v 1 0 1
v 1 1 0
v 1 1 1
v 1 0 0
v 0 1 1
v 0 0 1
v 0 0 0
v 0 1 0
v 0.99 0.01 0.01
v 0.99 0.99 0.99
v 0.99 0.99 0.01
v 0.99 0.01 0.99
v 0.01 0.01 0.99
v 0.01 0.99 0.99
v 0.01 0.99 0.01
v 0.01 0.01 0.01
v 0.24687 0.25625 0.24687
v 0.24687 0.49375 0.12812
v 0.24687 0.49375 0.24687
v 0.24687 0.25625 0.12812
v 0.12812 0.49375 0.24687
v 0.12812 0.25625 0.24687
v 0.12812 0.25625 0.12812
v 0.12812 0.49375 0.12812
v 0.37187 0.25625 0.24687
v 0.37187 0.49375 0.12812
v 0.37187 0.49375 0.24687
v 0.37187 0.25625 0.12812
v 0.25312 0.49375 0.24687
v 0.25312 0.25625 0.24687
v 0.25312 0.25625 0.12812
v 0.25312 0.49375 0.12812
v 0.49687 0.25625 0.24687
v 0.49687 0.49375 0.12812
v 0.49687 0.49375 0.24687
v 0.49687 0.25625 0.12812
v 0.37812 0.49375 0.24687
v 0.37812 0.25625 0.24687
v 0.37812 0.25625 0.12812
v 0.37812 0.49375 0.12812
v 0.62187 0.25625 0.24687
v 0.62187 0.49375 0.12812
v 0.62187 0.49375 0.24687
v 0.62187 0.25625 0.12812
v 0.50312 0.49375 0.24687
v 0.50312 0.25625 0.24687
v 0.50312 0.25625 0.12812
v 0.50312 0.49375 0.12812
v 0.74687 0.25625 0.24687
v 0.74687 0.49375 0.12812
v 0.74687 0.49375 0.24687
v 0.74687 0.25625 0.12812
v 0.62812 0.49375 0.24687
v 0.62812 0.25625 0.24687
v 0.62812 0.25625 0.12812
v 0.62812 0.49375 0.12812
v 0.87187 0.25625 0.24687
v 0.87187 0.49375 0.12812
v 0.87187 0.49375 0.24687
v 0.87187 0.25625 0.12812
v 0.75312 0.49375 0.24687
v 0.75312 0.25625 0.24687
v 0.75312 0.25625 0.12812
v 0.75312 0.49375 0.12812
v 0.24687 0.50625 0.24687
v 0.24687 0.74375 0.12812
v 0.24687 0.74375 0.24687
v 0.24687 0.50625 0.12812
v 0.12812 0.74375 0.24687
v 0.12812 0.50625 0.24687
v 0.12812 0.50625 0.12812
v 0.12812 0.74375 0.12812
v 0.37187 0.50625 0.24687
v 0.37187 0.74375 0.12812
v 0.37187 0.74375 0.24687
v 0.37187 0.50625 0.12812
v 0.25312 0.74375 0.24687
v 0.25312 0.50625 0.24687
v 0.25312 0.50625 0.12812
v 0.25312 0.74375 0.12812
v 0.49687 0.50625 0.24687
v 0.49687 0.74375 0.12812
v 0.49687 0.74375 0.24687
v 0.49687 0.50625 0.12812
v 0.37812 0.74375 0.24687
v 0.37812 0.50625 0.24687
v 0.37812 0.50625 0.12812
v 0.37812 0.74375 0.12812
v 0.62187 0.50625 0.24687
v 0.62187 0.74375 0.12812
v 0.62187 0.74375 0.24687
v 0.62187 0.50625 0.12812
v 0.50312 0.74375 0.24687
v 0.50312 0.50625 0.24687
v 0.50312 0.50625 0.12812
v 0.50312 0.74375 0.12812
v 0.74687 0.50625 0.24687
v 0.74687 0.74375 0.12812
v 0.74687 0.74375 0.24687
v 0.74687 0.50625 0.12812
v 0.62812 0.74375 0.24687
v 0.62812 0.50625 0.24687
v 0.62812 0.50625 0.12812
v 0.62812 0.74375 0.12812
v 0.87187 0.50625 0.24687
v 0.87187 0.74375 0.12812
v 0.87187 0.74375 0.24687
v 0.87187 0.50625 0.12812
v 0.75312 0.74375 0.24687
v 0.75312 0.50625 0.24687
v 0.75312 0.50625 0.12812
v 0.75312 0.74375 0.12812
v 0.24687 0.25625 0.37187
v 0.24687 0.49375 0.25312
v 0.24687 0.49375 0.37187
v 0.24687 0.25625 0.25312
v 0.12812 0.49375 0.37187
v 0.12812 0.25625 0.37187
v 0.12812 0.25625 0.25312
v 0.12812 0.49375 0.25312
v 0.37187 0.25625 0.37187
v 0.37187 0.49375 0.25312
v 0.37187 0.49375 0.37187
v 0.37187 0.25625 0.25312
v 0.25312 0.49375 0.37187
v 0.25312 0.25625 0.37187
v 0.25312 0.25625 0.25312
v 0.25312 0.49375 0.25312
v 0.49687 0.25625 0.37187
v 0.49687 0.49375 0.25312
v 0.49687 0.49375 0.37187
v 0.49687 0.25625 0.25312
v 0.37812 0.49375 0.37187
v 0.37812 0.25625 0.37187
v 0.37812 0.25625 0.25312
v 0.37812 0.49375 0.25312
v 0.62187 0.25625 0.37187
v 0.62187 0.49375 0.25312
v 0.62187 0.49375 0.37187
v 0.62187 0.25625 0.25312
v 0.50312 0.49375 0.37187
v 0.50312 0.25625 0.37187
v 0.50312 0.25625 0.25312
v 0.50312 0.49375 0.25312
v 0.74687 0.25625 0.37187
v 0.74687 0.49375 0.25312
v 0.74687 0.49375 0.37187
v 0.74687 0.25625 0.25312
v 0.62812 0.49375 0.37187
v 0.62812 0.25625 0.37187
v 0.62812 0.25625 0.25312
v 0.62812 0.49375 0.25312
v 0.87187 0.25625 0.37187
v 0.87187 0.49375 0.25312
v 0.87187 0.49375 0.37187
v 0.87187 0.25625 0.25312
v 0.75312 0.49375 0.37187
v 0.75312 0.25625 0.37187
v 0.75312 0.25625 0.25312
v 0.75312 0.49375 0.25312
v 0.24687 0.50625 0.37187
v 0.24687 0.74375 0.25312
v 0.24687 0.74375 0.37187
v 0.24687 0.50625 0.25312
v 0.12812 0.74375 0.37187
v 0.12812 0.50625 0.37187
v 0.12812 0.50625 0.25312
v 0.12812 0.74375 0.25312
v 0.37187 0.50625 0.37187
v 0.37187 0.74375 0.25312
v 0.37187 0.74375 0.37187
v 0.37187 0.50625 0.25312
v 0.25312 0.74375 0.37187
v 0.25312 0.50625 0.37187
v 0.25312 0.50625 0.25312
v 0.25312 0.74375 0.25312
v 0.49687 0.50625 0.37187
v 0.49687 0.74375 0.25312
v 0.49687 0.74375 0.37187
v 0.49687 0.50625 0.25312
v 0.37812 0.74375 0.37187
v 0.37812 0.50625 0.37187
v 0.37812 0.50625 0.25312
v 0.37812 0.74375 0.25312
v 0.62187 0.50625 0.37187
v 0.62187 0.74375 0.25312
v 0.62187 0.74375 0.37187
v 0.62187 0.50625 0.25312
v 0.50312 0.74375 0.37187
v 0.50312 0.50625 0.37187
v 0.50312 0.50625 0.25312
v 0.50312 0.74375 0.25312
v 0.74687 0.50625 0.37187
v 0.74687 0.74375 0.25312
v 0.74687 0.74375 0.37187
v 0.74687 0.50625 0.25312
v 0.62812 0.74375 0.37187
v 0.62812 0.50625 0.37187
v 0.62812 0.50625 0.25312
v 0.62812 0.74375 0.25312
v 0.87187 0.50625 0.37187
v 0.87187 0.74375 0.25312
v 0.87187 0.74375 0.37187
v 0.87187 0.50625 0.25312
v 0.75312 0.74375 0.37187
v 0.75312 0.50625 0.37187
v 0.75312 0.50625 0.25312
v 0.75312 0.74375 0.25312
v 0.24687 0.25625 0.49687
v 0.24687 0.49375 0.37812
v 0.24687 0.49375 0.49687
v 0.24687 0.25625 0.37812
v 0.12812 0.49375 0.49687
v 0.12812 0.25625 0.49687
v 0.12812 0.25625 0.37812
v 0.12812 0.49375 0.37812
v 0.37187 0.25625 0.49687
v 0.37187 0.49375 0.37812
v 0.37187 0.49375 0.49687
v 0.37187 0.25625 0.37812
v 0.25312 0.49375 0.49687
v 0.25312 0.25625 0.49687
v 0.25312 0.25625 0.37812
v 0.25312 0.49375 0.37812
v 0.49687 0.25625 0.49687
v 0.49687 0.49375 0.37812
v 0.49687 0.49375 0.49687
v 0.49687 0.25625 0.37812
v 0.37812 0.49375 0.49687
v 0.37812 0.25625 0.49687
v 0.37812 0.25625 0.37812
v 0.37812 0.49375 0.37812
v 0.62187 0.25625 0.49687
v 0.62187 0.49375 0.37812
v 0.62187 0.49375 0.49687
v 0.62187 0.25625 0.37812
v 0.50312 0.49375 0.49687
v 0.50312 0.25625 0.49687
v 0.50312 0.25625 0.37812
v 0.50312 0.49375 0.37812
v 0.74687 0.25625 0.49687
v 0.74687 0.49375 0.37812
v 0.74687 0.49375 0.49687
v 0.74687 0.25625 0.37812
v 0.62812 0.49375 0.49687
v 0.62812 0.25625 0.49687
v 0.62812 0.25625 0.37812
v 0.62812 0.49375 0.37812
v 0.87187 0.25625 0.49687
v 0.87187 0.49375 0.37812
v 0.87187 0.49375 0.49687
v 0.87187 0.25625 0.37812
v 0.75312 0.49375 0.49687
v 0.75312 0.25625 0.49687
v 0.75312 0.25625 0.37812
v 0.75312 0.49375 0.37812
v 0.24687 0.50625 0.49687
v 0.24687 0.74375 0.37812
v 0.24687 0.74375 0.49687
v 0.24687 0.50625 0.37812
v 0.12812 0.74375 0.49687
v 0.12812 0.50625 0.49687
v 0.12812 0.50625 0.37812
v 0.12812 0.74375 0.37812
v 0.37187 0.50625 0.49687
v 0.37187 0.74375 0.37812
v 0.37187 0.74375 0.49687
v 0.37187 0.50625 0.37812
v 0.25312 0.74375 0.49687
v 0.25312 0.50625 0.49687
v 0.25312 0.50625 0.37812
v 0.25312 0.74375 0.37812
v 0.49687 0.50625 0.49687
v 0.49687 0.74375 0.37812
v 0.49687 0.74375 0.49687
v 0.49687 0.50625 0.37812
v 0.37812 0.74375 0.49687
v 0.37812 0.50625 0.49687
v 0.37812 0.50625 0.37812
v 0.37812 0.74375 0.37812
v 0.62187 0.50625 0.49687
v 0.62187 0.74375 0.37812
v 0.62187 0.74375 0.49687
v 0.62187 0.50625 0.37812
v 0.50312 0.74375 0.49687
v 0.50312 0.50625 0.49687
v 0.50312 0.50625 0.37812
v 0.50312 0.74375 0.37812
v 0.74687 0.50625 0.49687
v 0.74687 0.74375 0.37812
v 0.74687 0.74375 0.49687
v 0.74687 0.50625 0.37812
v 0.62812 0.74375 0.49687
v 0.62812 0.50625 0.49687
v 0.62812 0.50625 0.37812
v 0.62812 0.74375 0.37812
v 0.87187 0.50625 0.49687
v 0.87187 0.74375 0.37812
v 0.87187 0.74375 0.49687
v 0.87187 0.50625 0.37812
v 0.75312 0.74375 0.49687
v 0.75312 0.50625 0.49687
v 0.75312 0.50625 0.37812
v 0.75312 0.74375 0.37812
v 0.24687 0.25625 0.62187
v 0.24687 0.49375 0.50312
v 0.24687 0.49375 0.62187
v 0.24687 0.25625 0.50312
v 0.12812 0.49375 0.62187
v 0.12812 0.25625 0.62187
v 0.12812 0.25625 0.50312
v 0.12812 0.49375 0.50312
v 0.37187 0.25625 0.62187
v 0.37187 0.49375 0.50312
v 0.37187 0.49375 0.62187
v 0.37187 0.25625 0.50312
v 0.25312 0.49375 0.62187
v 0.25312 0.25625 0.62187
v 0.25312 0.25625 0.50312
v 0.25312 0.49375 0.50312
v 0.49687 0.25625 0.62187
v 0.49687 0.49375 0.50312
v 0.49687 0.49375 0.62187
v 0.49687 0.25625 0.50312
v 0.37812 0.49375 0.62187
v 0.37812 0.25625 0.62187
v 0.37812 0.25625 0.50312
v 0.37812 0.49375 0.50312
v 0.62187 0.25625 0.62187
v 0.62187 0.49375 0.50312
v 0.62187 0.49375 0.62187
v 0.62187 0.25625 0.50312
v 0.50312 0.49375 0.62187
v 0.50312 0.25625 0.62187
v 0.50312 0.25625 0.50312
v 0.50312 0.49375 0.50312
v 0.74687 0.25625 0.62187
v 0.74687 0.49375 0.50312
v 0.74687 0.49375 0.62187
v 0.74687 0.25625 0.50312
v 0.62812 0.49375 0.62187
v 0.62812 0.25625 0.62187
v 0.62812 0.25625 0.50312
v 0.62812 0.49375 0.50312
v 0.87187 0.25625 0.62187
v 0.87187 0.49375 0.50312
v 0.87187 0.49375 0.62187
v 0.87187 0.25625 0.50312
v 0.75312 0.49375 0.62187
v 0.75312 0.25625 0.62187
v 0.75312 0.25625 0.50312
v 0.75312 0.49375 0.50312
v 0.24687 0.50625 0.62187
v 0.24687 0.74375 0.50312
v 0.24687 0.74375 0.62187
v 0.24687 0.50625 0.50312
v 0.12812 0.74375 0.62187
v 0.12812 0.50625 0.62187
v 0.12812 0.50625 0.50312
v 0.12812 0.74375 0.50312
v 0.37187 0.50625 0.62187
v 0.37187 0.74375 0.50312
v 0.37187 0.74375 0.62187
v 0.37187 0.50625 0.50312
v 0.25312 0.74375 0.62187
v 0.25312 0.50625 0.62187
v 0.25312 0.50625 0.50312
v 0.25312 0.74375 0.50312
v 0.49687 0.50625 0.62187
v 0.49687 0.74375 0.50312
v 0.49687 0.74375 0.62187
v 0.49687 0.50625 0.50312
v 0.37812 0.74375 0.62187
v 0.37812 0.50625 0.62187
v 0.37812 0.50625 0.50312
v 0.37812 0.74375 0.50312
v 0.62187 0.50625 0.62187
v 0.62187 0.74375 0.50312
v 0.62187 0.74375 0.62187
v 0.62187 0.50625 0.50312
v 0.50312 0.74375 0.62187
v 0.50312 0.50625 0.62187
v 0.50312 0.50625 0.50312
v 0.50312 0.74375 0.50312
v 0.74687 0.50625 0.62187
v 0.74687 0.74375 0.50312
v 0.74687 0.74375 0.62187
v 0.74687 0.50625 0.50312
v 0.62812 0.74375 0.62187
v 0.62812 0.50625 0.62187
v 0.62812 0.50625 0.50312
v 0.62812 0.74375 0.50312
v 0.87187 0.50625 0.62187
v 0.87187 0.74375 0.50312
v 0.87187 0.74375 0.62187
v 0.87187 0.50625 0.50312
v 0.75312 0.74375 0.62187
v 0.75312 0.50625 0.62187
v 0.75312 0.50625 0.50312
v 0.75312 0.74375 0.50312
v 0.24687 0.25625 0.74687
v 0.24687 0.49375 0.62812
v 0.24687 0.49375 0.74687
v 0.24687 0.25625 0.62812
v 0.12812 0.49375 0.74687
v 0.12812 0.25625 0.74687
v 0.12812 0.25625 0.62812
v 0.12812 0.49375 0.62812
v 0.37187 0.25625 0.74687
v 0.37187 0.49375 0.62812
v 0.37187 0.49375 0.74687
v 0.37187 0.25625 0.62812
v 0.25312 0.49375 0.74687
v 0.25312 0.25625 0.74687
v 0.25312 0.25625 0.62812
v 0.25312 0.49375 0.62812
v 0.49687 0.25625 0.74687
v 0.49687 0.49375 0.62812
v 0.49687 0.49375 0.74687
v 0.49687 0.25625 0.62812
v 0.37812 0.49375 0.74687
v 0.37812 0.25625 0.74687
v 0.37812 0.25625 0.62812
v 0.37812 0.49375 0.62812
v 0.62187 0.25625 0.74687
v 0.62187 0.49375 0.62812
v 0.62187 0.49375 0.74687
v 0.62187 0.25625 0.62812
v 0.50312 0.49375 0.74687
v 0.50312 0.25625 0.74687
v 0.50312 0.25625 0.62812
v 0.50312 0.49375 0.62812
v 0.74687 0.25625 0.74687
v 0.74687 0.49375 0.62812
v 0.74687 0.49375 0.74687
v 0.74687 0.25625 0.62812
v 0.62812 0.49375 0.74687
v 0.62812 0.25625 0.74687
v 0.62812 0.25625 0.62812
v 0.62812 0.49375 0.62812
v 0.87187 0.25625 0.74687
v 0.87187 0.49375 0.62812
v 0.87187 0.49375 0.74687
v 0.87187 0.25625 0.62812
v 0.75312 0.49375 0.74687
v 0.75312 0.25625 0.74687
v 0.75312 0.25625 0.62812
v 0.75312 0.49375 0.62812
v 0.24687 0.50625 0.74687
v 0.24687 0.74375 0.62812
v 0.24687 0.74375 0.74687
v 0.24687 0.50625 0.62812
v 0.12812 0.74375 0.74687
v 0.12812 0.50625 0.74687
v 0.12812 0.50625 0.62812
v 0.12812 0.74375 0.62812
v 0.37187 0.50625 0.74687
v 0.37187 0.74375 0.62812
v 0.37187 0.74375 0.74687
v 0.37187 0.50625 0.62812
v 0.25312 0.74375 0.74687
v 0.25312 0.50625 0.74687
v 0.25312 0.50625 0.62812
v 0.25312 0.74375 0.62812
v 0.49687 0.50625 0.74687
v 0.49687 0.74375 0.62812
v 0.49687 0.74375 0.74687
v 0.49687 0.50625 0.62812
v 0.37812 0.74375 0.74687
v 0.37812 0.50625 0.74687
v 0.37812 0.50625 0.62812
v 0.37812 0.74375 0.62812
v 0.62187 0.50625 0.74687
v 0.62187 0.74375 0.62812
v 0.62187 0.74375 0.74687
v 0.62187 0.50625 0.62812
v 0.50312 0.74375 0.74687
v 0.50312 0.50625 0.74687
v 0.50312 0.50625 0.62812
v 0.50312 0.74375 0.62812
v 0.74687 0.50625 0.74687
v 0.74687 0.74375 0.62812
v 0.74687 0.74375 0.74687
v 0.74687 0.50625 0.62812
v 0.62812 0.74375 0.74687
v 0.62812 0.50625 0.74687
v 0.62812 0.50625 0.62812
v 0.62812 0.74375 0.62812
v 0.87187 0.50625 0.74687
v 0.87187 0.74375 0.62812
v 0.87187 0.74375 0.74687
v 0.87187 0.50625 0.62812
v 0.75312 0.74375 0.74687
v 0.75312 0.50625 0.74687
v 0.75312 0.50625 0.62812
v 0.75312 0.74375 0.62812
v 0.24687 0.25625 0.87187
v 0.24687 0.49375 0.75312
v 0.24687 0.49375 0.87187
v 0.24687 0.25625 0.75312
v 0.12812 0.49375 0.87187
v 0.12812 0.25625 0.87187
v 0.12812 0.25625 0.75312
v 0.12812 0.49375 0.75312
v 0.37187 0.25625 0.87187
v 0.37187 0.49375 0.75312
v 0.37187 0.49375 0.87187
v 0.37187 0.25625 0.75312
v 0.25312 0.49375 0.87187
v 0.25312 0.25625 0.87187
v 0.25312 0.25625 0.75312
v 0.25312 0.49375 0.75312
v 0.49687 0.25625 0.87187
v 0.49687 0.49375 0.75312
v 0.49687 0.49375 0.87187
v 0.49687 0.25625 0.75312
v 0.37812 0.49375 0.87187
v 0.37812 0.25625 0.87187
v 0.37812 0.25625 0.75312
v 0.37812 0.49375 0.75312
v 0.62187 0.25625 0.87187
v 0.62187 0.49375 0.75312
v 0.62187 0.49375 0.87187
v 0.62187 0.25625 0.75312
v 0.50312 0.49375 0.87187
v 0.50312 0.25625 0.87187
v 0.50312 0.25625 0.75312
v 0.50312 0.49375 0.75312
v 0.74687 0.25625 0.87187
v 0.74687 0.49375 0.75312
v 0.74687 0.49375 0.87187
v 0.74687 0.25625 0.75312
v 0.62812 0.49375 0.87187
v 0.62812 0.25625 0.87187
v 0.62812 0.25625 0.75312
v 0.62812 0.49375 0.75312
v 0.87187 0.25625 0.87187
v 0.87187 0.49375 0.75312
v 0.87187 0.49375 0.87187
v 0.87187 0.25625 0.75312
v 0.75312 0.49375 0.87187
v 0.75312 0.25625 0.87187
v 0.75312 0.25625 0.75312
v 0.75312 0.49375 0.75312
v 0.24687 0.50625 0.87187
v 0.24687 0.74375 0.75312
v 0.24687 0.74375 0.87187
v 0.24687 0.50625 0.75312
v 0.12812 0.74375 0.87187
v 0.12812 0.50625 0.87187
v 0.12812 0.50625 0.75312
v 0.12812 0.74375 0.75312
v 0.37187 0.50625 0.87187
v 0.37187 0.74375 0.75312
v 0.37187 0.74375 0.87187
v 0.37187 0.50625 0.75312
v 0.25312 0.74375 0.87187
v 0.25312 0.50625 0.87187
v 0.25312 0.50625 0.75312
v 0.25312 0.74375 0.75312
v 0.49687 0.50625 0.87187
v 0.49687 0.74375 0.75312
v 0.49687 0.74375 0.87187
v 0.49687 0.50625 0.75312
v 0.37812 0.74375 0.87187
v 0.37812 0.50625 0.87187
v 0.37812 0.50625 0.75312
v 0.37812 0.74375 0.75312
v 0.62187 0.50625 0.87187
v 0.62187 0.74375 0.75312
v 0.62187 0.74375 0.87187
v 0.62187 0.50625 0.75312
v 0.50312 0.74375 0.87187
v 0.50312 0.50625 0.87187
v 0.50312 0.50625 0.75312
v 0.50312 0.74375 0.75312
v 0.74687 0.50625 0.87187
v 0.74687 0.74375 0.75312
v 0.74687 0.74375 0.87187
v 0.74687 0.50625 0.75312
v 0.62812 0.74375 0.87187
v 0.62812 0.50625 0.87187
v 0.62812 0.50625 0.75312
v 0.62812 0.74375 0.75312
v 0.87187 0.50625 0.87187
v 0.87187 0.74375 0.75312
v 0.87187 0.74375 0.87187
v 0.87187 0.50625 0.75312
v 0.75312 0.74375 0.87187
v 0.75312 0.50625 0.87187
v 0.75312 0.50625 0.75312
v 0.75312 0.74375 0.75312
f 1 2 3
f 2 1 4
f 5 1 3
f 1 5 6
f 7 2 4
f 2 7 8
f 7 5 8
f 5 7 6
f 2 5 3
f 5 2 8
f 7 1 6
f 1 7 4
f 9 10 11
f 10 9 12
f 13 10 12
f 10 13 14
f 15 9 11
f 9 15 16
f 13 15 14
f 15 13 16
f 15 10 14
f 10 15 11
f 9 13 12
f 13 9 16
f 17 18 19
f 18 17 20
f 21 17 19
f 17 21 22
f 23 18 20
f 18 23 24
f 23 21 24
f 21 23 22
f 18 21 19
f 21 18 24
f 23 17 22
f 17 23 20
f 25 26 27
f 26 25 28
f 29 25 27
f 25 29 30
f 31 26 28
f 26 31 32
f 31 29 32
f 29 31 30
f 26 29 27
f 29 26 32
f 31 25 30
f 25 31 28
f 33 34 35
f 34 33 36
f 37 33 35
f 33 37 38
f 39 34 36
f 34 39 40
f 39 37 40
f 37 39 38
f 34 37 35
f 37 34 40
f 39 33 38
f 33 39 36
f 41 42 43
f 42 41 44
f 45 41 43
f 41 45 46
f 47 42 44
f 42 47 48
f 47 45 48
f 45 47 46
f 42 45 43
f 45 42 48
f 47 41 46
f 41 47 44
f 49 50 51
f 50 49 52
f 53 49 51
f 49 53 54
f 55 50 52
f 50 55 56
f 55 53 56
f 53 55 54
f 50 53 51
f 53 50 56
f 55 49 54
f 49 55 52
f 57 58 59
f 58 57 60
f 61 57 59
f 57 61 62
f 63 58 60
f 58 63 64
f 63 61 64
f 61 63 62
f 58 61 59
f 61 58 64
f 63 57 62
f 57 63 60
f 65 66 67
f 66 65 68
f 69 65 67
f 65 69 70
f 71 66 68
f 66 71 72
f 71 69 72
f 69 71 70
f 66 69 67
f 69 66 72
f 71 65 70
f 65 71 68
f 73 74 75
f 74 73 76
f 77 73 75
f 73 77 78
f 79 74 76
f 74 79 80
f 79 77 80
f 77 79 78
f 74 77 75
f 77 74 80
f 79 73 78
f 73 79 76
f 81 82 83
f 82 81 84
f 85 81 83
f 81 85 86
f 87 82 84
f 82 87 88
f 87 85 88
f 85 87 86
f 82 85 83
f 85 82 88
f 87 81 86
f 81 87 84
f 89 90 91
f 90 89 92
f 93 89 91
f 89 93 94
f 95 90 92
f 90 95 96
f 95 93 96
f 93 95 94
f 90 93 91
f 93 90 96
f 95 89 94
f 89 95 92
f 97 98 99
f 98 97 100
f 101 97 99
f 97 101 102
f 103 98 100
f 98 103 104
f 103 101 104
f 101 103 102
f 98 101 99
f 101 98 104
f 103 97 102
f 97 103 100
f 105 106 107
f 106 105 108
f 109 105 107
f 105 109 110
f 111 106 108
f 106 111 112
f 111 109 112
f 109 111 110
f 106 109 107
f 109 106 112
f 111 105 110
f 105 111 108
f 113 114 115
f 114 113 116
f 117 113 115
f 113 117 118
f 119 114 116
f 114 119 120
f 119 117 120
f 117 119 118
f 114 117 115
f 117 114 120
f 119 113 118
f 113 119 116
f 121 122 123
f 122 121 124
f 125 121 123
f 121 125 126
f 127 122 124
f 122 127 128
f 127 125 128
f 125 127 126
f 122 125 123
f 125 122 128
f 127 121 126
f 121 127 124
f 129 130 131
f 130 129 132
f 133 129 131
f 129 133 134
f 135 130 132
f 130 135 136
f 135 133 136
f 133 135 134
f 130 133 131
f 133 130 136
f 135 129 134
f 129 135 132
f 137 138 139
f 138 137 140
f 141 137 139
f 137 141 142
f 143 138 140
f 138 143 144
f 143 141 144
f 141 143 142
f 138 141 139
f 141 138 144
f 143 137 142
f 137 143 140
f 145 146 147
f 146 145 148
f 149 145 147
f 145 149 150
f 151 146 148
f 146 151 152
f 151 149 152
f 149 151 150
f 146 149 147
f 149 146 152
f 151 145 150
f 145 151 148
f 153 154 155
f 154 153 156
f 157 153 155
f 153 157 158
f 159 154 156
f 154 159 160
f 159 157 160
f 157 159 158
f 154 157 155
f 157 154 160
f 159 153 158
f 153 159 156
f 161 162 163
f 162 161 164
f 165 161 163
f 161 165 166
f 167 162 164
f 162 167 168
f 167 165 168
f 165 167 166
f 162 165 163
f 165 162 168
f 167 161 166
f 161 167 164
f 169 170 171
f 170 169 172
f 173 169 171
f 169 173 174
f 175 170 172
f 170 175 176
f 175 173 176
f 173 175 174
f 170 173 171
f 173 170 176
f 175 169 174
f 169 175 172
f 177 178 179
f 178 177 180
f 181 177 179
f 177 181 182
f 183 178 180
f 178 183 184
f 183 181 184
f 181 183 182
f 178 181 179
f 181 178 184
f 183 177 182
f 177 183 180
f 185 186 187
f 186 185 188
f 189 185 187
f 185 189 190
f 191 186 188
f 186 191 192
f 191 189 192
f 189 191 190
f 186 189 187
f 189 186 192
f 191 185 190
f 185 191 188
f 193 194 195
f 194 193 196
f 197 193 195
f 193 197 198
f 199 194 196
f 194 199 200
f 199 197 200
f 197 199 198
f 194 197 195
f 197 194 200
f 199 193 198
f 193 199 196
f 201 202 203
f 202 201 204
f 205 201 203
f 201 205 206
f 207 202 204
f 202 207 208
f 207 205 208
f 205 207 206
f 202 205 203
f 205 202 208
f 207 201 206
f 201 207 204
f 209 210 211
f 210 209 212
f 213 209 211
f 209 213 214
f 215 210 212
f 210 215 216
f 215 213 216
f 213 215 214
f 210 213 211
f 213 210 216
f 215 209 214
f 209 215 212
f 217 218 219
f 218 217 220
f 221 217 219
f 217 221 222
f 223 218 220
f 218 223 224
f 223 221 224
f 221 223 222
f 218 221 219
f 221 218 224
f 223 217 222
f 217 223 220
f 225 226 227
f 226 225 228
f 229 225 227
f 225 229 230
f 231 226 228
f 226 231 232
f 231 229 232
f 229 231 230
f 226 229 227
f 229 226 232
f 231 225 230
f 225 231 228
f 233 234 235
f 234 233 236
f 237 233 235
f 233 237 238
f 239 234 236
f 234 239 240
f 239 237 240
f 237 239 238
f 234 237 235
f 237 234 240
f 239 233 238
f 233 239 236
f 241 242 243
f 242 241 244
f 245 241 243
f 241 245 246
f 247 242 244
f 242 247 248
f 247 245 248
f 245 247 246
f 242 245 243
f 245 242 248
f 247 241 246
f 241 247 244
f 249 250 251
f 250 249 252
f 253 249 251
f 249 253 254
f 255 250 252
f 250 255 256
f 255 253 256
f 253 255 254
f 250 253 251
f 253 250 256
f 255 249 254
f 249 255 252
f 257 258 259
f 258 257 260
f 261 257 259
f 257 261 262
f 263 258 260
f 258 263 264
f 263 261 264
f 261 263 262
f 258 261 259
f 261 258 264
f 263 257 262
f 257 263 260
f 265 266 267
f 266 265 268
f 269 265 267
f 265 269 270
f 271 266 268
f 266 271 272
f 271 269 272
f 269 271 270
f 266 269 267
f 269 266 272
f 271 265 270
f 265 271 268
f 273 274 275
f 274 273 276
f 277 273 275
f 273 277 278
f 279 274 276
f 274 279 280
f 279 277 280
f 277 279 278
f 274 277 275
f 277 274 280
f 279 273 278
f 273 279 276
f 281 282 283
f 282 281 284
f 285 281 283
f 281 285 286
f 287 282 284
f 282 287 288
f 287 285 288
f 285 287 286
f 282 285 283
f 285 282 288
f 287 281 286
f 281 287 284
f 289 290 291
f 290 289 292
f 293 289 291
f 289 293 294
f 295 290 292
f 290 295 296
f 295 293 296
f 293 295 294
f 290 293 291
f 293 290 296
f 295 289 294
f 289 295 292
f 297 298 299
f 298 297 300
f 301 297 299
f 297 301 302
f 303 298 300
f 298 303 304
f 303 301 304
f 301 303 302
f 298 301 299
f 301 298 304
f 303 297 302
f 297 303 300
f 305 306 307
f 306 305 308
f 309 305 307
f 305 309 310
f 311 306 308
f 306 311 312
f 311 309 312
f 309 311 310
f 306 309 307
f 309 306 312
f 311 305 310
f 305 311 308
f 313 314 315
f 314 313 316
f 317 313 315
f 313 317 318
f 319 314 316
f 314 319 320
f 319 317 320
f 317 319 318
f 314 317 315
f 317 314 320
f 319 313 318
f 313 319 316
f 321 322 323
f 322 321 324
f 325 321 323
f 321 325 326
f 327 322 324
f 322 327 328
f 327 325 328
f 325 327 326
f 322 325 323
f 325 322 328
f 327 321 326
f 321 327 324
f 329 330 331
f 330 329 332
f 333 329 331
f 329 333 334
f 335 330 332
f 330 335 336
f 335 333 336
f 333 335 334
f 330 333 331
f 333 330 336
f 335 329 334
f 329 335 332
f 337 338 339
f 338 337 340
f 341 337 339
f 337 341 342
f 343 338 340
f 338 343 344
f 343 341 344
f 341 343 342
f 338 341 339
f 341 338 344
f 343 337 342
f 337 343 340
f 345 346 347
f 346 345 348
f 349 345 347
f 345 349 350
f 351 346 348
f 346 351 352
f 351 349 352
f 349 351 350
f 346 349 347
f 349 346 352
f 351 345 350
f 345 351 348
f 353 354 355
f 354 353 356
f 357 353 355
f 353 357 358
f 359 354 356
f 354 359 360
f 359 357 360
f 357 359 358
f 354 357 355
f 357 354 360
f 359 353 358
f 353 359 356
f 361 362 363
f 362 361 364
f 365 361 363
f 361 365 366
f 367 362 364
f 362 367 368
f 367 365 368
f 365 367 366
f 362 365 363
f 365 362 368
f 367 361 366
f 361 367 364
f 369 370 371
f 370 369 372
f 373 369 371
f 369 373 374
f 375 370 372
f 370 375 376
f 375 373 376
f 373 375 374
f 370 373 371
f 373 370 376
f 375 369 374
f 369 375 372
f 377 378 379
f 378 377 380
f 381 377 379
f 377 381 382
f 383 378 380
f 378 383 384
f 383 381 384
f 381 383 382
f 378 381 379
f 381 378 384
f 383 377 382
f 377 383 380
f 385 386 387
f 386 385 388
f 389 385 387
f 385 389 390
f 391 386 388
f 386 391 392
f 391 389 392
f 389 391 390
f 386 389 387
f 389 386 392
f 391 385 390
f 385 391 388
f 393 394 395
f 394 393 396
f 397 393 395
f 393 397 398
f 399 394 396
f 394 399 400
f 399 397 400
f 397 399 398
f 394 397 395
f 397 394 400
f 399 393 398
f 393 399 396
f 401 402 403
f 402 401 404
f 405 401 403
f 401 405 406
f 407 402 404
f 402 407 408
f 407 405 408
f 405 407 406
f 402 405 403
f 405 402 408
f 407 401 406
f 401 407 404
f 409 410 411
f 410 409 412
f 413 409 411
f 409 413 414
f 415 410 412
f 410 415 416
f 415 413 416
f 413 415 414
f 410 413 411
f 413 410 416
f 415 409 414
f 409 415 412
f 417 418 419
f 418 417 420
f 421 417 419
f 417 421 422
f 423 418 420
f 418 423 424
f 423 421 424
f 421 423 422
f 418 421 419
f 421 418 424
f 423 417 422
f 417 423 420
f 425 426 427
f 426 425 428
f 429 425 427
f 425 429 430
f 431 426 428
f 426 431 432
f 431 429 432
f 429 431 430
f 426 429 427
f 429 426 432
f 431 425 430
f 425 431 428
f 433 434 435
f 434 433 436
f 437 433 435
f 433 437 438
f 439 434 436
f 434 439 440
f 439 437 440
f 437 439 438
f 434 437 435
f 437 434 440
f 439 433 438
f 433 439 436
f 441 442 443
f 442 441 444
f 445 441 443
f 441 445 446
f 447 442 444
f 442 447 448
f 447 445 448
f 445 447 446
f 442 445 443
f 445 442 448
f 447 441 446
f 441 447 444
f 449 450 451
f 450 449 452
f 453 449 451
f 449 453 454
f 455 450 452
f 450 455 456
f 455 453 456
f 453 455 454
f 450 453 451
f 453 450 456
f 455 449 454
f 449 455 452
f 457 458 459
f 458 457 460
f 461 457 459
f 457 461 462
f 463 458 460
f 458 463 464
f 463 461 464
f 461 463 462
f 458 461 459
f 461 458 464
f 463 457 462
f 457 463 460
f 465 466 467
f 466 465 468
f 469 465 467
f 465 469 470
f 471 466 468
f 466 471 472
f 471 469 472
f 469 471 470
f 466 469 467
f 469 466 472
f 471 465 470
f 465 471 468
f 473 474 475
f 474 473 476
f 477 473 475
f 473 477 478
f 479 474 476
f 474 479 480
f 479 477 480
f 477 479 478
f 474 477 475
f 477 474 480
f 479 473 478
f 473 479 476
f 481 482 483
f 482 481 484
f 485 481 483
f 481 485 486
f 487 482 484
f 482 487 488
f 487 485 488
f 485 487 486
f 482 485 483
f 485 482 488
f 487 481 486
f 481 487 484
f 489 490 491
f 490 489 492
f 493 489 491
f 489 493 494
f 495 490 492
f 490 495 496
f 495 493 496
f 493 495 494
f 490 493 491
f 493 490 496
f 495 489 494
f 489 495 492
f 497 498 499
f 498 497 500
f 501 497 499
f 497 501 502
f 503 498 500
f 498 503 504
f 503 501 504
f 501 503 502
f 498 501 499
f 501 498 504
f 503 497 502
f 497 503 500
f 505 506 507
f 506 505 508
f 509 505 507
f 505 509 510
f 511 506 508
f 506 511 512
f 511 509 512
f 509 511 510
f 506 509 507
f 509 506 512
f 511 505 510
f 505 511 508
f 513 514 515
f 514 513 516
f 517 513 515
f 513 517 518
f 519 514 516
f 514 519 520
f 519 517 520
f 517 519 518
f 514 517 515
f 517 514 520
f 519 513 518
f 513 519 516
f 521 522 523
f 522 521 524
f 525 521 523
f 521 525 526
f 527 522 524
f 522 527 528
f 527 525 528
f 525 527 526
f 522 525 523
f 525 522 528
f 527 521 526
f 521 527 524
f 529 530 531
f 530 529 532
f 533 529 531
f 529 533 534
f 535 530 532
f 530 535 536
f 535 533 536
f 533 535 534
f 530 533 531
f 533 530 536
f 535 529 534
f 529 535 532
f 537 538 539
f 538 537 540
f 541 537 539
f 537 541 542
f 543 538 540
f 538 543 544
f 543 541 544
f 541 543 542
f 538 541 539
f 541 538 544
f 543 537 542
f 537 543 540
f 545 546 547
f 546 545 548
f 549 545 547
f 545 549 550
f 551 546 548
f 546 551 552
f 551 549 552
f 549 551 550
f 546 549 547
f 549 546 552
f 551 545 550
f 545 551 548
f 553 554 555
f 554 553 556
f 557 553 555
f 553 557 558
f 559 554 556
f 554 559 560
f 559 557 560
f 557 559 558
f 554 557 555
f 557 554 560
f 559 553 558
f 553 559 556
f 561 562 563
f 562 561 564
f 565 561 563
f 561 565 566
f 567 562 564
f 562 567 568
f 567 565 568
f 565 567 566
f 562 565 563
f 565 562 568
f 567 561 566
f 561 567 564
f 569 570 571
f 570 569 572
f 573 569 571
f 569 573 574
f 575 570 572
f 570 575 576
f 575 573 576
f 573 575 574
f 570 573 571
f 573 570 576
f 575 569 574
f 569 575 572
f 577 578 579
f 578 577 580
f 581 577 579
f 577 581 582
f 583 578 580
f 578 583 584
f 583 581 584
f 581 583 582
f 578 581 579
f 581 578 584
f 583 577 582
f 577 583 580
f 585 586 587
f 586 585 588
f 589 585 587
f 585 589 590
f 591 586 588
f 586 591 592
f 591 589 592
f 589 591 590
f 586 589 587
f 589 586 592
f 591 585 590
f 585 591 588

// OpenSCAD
translate([0.1875, 0.375, 0.1875]) color([0.7670397757471089, 0.17483880300164423, 0.7474114244696689]) cube([0.11875, 0.2375, 0.11875], center=true);
translate([0.3125, 0.375, 0.1875]) color([0.6015236368594579, 0.5872808850844162, 0.28390336255679416]) cube([0.11875, 0.2375, 0.11875], center=true);
translate([0.4375, 0.375, 0.1875]) color([0.5839405385485582, 0.4048698908705002, 0.6877557316706271]) cube([0.11875, 0.2375, 0.11875], center=true);
translate([0.5625, 0.375, 0.1875]) color([0.29310936231965135, 0.08456113000314536, 0.6409271470126323]) cube([0.11875, 0.2375, 0.11875], center=true);
translate([0.6875, 0.375, 0.1875]) color([0.38512246522478266, 0.6162859510128613, 0.407224705538046]) cube([0.11875, 0.2375, 0.11875], center=true);
translate([0.8125, 0.375, 0.1875]) color([0.6107800780239486, 0.9541913078580654, 0.09369719926319908]) cube([0.11875, 0.2375, 0.11875], center=true);
translate([0.1875, 0.625, 0.1875]) color([0.4396226851829427, 0.9817497074141792, 0.30111933510979894]) cube([0.11875, 0.2375, 0.11875], center=true);
translate([0.3125, 0.625, 0.1875]) color([0.08571041628526821, 0.691130580335744, 0.16573157374072334]) cube([0.11875, 0.2375, 0.11875], center=true);
translate([0.4375, 0.625, 0.1875]) color([0.4668304924867862, 0.30100213617539295, 0.3511677492745029]) cube([0.11875, 0.2375, 0.11875], center=true);
translate([0.5625, 0.625, 0.1875]) color([0.05564944269037686, 0.7696481469448815, 0.686275624239137]) cube([0.11875, 0.2375, 0.11875], center=true);
translate([0.6875, 0.625, 0.1875]) color([0.15447252119296884, 0.35335085758162643, 0.18799175914388588]) cube([0.11875, 0.2375, 0.11875], center=true);
translate([0.8125, 0.625, 0.1875]) color([0.41322879780265653, 0.82270842281296, 0.9057146612667819]) cube([0.11875, 0.2375, 0.11875], center=true);
translate([0.1875, 0.375, 0.3125]) color([0.9688547633127277, 0.5528378273263655, 0.12760284187612392]) cube([0.11875, 0.2375, 0.11875], center=true);
translate([0.3125, 0.375, 0.3125]) color([0.1710979555253146, 0.7131998843266452, 0.6397779425125977]) cube([0.11875, 0.2375, 0.11875], center=true);
translate([0.4375, 0.375, 0.3125]) color([0.57496968906483, 0.8489371230716904, 0.07944838941339594]) cube([0.11875, 0.2375, 0.11875], center=true);
translate([0.5625, 0.375, 0.3125]) color([0.040333123224873146, 0.9305910632054132, 0.3080440975445232]) cube([0.11875, 0.2375, 0.11875], center=true);
translate([0.6875, 0.375, 0.3125]) color([0.6084655882345898, 0.4923441190446234, 0.7069385087242315]) cube([0.11875, 0.2375, 0.11875], center=true);
translate([0.8125, 0.375, 0.3125]) color([0.6803385961846494, 0.18024793645131376, 0.10787678186317007]) cube([0.11875, 0.2375, 0.11875], center=true);
translate([0.1875, 0.625, 0.3125]) color([0.1335624130282893, 0.47731112778056706, 0.8393950916733898]) cube([0.11875, 0.2375, 0.11875], center=true);
translate([0.3125, 0.625, 0.3125]) color([0.6780893207968227, 0.08337096158279222, 0.27725115680544954]) cube([0.11875, 0.2375, 0.11875], center=true);
translate([0.4375, 0.625, 0.3125]) color([0.9965791662073833, 0.03375154870506614, 0.10494976972159242]) cube([0.11875, 0.2375, 0.11875], center=true);
translate([0.5625, 0.625, 0.3125]) color([0.516844917539197, 0.1360610465034362, 0.543805910213663]) cube([0.11875, 0.2375, 0.11875], center=true);
translate([0.6875, 0.625, 0.3125]) color([0.04901628196141694, 0.4867102513994055, 0.8813892002857401]) cube([0.11875, 0.2375, 0.11875], center=true);
translate([0.8125, 0.625, 0.3125]) color([0.3053751014353143, 0.40772022041766365, 0.31297204198076634]) cube([0.11875, 0.2375, 0.11875], center=true);
translate([0.1875, 0.375, 0.4375]) color([0.49907796034366436, 0.6160709555012981, 0.9916538905911245]) cube([0.11875, 0.2375, 0.11875], center=true);
translate([0.3125, 0.375, 0.4375]) color([0.3123575451593331, 0.46364206475662195, 0.8862899719975306]) cube([0.11875, 0.2375, 0.11875], center=true);
translate([0.4375, 0.375, 0.4375]) color([0.5738800220993816, 0.8494037217359881, 0.24323676398212035]) cube([0.11875, 0.2375, 0.11875], center=true);
translate([0.5625, 0.375, 0.4375]) color([0.8402878098664139, 0.9530478541805099, 0.16594803365564914]) cube([0.11875, 0.2375, 0.11875], center=true);
translate([0.6875, 0.375, 0.4375]) color([0.0023370868964924796, 0.7387895340607371, 0.5374530602666081]) cube([0.11875, 0.2375, 0.11875], center=true);
translate([0.8125, 0.375, 0.4375]) color([0.25604025835089217, 0.4320068924153808, 0.5112453323210508]) cube([0.11875, 0.2375, 0.11875], center=true);
translate([0.1875, 0.625, 0.4375]) color([0.7462272619347637, 0.5039790716190428, 0.8850839351693509]) cube([0.11875, 0.2375, 0.11875], center=true);
translate([0.3125, 0.625, 0.4375]) color([0.6652757233710683, 0.22263754843686523, 0.08942086350367451]) cube([0.11875, 0.2375, 0.11875], center=true);
translate([0.4375, 0.625, 0.4375]) color([0.6195232841458308, 0.9036720387350747, 0.7222923954673625]) cube([0.11875, 0.2375, 0.11875], center=true);
translate([0.5625, 0.625, 0.4375]) color([0.6665075097113882, 0.5421139713900744, 0.6943978877819516]) cube([0.11875, 0.2375, 0.11875], center=true);
translate([0.6875, 0.625, 0.4375]) color([0.9269770591996176, 0.12480324665016229, 0.8422397758241813]) cube([0.11875, 0.2375, 0.11875], center=true);
translate([0.8125, 0.625, 0.4375]) color([0.028249143050612435, 0.8554899328562455, 0.6212809598996976]) cube([0.11875, 0.2375, 0.11875], center=true);
translate([0.1875, 0.375, 0.5625]) color([0.6435486749275994, 0.4857227915978113, 0.2898251547629681]) cube([0.11875, 0.2375, 0.11875], center=true);
translate([0.3125, 0.375, 0.5625]) color([0.21709076393122206, 0.4979948584580751, 0.6176241526046676]) cube([0.11875, 0.2375, 0.11875], center=true);
translate([0.4375, 0.375, 0.5625]) color([0.4722249532281336, 0.7228331534363125, 0.6109414561657331]) cube([0.11875, 0.2375, 0.11875], center=true);
translate([0.5625, 0.375, 0.5625]) color([0.5330085163671737, 0.6769359871291822, 0.5973748769978083]) cube([0.11875, 0.2375, 0.11875], center=true);
translate([0.6875, 0.375, 0.5625]) color([0.14460255854654236, 0.21273280877313017, 0.8417179364881341]) cube([0.11875, 0.2375, 0.11875], center=true);
translate([0.8125, 0.375, 0.5625]) color([0.6300391880279899, 0.5103677782275869, 0.4479627161837708]) cube([0.11875, 0.2375, 0.11875], center=true);
translate([0.1875, 0.625, 0.5625]) color([0.2903518628620462, 0.1744676713524972, 0.5457372127765215]) cube([0.11875, 0.2375, 0.11875], center=true);
translate([0.3125, 0.625, 0.5625]) color([0.6340658375422632, 0.7004271366493812, 0.690956934786038]) cube([0.11875, 0.2375, 0.11875], center=true);
translate([0.4375, 0.625, 0.5625]) color([0.013948469234104865, 0.8018456354370093, 0.2607079205191076]) cube([0.11875, 0.2375, 0.11875], center=true);
translate([0.5625, 0.625, 0.5625]) color([0.01899716010339858, 0.7507132946374245, 0.44168653561511173]) cube([0.11875, 0.2375, 0.11875], center=true);
translate([0.6875, 0.625, 0.5625]) color([0.1668653701245908, 0.45955837321901094, 0.7876756969907556]) cube([0.11875, 0.2375, 0.11875], center=true);
translate([0.8125, 0.625, 0.5625]) color([0.09564527702692727, 0.06733136152719421, 0.7816649665975636]) cube([0.11875, 0.2375, 0.11875], center=true);
translate([0.1875, 0.375, 0.6875]) color([0.030385075649315252, 0.33346286891595733, 0.08647112242809318]) cube([0.11875, 0.2375, 0.11875], center=true);
translate([0.3125, 0.375, 0.6875]) color([0.8161439782233904, 0.05657658467482607, 0.8243668117903717]) cube([0.11875, 0.2375, 0.11875], center=true);
translate([0.4375, 0.375, 0.6875]) color([0.05808931884644186, 0.6181904095369413, 0.1426995958976538]) cube([0.11875, 0.2375, 0.11875], center=true);
translate([0.5625, 0.375, 0.6875]) color([0.3846464495954227, 0.3794414211645075, 0.7643773332264734]) cube([0.11875, 0.2375, 0.11875], center=true);
translate([0.6875, 0.375, 0.6875]) color([0.3116889002403487, 0.7690158776827113, 0.7674729074453902]) cube([0.11875, 0.2375, 0.11875], center=true);
translate([0.8125, 0.375, 0.6875]) color([0.3394448706328078, 0.45855440081433096, 0.0007502935671159783]) cube([0.11875, 0.2375, 0.11875], center=true);
translate([0.1875, 0.625, 0.6875]) color([0.8084995756647368, 0.0331322283588068, 0.9954935019736515]) cube([0.11875, 0.2375, 0.11875], center=true);
translate([0.3125, 0.625, 0.6875]) color([0.32750610520168044, 0.511786711221762, 0.09639677946248049]) cube([0.11875, 0.2375, 0.11875], center=true);
translate([0.4375, 0.625, 0.6875]) color([0.46647601470953737, 0.043404226035316795, 0.8089506697449751]) cube([0.11875, 0.2375, 0.11875], center=true);
translate([0.5625, 0.625, 0.6875]) color([0.9065579579370614, 0.48874197586323487, 0.4689182776921319]) cube([0.11875, 0.2375, 0.11875], center=true);
translate([0.6875, 0.625, 0.6875]) color([0.9999833648369341, 0.42392948264922625, 0.11056216143511133]) cube([0.11875, 0.2375, 0.11875], center=true);
translate([0.8125, 0.625, 0.6875]) color([0.5007484231317689, 0.23725843071495933, 0.7435751616565288]) cube([0.11875, 0.2375, 0.11875], center=true);
translate([0.1875, 0.375, 0.8125]) color([0.030326511183225713, 0.9534383365251057, 0.44454391677925087]) cube([0.11875, 0.2375, 0.11875], center=true);
translate([0.3125, 0.375, 0.8125]) color([0.4017260225039573, 0.6984802625757133, 0.14751428227125585]) cube([0.11875, 0.2375, 0.11875], center=true);
translate([0.4375, 0.375, 0.8125]) color([0.592053202978914, 0.7602792343344718, 0.23214841748979886]) cube([0.11875, 0.2375, 0.11875], center=true);
translate([0.5625, 0.375, 0.8125]) color([0.2215781656479593, 0.24536616409996503, 0.7021925659500807]) cube([0.11875, 0.2375, 0.11875], center=true);
translate([0.6875, 0.375, 0.8125]) color([0.5457605096294114, 0.54011508338913, 0.5459453680001618]) cube([0.11875, 0.2375, 0.11875], center=true);
translate([0.8125, 0.375, 0.8125]) color([0.21439919344985514, 0.4167057873106884, 0.6193494045718565]) cube([0.11875, 0.2375, 0.11875], center=true);
translate([0.1875, 0.625, 0.8125]) color([0.45760594266221877, 0.8933837090972113, 0.8109172526149769]) cube([0.11875, 0.2375, 0.11875], center=true);
translate([0.3125, 0.625, 0.8125]) color([0.14833972802097417, 0.6068004170768148, 0.5080529466064481]) cube([0.11875, 0.2375, 0.11875], center=true);
translate([0.4375, 0.625, 0.8125]) color([0.9906187087676633, 0.11352393843166497, 0.6883720652754897]) cube([0.11875, 0.2375, 0.11875], center=true);
translate([0.5625, 0.625, 0.8125]) color([0.5952346609945763, 0.6540807806784664, 0.3474259839548979]) cube([0.11875, 0.2375, 0.11875], center=true);
translate([0.6875, 0.625, 0.8125]) color([0.9928586924360654, 0.247192741454632, 0.70975753974483]) cube([0.11875, 0.2375, 0.11875], center=true);
translate([0.8125, 0.625, 0.8125]) color([0.13794757021236903, 0.4611444179186315, 0.04899626755467579]) cube([0.11875, 0.2375, 0.11875], center=true);
color([0.3,0.3,0.3,0.3]) difference() { cube([1,1,1]); translate([0.01,0.01,0.01]) cube([0.98,0.98,0.98]); }
